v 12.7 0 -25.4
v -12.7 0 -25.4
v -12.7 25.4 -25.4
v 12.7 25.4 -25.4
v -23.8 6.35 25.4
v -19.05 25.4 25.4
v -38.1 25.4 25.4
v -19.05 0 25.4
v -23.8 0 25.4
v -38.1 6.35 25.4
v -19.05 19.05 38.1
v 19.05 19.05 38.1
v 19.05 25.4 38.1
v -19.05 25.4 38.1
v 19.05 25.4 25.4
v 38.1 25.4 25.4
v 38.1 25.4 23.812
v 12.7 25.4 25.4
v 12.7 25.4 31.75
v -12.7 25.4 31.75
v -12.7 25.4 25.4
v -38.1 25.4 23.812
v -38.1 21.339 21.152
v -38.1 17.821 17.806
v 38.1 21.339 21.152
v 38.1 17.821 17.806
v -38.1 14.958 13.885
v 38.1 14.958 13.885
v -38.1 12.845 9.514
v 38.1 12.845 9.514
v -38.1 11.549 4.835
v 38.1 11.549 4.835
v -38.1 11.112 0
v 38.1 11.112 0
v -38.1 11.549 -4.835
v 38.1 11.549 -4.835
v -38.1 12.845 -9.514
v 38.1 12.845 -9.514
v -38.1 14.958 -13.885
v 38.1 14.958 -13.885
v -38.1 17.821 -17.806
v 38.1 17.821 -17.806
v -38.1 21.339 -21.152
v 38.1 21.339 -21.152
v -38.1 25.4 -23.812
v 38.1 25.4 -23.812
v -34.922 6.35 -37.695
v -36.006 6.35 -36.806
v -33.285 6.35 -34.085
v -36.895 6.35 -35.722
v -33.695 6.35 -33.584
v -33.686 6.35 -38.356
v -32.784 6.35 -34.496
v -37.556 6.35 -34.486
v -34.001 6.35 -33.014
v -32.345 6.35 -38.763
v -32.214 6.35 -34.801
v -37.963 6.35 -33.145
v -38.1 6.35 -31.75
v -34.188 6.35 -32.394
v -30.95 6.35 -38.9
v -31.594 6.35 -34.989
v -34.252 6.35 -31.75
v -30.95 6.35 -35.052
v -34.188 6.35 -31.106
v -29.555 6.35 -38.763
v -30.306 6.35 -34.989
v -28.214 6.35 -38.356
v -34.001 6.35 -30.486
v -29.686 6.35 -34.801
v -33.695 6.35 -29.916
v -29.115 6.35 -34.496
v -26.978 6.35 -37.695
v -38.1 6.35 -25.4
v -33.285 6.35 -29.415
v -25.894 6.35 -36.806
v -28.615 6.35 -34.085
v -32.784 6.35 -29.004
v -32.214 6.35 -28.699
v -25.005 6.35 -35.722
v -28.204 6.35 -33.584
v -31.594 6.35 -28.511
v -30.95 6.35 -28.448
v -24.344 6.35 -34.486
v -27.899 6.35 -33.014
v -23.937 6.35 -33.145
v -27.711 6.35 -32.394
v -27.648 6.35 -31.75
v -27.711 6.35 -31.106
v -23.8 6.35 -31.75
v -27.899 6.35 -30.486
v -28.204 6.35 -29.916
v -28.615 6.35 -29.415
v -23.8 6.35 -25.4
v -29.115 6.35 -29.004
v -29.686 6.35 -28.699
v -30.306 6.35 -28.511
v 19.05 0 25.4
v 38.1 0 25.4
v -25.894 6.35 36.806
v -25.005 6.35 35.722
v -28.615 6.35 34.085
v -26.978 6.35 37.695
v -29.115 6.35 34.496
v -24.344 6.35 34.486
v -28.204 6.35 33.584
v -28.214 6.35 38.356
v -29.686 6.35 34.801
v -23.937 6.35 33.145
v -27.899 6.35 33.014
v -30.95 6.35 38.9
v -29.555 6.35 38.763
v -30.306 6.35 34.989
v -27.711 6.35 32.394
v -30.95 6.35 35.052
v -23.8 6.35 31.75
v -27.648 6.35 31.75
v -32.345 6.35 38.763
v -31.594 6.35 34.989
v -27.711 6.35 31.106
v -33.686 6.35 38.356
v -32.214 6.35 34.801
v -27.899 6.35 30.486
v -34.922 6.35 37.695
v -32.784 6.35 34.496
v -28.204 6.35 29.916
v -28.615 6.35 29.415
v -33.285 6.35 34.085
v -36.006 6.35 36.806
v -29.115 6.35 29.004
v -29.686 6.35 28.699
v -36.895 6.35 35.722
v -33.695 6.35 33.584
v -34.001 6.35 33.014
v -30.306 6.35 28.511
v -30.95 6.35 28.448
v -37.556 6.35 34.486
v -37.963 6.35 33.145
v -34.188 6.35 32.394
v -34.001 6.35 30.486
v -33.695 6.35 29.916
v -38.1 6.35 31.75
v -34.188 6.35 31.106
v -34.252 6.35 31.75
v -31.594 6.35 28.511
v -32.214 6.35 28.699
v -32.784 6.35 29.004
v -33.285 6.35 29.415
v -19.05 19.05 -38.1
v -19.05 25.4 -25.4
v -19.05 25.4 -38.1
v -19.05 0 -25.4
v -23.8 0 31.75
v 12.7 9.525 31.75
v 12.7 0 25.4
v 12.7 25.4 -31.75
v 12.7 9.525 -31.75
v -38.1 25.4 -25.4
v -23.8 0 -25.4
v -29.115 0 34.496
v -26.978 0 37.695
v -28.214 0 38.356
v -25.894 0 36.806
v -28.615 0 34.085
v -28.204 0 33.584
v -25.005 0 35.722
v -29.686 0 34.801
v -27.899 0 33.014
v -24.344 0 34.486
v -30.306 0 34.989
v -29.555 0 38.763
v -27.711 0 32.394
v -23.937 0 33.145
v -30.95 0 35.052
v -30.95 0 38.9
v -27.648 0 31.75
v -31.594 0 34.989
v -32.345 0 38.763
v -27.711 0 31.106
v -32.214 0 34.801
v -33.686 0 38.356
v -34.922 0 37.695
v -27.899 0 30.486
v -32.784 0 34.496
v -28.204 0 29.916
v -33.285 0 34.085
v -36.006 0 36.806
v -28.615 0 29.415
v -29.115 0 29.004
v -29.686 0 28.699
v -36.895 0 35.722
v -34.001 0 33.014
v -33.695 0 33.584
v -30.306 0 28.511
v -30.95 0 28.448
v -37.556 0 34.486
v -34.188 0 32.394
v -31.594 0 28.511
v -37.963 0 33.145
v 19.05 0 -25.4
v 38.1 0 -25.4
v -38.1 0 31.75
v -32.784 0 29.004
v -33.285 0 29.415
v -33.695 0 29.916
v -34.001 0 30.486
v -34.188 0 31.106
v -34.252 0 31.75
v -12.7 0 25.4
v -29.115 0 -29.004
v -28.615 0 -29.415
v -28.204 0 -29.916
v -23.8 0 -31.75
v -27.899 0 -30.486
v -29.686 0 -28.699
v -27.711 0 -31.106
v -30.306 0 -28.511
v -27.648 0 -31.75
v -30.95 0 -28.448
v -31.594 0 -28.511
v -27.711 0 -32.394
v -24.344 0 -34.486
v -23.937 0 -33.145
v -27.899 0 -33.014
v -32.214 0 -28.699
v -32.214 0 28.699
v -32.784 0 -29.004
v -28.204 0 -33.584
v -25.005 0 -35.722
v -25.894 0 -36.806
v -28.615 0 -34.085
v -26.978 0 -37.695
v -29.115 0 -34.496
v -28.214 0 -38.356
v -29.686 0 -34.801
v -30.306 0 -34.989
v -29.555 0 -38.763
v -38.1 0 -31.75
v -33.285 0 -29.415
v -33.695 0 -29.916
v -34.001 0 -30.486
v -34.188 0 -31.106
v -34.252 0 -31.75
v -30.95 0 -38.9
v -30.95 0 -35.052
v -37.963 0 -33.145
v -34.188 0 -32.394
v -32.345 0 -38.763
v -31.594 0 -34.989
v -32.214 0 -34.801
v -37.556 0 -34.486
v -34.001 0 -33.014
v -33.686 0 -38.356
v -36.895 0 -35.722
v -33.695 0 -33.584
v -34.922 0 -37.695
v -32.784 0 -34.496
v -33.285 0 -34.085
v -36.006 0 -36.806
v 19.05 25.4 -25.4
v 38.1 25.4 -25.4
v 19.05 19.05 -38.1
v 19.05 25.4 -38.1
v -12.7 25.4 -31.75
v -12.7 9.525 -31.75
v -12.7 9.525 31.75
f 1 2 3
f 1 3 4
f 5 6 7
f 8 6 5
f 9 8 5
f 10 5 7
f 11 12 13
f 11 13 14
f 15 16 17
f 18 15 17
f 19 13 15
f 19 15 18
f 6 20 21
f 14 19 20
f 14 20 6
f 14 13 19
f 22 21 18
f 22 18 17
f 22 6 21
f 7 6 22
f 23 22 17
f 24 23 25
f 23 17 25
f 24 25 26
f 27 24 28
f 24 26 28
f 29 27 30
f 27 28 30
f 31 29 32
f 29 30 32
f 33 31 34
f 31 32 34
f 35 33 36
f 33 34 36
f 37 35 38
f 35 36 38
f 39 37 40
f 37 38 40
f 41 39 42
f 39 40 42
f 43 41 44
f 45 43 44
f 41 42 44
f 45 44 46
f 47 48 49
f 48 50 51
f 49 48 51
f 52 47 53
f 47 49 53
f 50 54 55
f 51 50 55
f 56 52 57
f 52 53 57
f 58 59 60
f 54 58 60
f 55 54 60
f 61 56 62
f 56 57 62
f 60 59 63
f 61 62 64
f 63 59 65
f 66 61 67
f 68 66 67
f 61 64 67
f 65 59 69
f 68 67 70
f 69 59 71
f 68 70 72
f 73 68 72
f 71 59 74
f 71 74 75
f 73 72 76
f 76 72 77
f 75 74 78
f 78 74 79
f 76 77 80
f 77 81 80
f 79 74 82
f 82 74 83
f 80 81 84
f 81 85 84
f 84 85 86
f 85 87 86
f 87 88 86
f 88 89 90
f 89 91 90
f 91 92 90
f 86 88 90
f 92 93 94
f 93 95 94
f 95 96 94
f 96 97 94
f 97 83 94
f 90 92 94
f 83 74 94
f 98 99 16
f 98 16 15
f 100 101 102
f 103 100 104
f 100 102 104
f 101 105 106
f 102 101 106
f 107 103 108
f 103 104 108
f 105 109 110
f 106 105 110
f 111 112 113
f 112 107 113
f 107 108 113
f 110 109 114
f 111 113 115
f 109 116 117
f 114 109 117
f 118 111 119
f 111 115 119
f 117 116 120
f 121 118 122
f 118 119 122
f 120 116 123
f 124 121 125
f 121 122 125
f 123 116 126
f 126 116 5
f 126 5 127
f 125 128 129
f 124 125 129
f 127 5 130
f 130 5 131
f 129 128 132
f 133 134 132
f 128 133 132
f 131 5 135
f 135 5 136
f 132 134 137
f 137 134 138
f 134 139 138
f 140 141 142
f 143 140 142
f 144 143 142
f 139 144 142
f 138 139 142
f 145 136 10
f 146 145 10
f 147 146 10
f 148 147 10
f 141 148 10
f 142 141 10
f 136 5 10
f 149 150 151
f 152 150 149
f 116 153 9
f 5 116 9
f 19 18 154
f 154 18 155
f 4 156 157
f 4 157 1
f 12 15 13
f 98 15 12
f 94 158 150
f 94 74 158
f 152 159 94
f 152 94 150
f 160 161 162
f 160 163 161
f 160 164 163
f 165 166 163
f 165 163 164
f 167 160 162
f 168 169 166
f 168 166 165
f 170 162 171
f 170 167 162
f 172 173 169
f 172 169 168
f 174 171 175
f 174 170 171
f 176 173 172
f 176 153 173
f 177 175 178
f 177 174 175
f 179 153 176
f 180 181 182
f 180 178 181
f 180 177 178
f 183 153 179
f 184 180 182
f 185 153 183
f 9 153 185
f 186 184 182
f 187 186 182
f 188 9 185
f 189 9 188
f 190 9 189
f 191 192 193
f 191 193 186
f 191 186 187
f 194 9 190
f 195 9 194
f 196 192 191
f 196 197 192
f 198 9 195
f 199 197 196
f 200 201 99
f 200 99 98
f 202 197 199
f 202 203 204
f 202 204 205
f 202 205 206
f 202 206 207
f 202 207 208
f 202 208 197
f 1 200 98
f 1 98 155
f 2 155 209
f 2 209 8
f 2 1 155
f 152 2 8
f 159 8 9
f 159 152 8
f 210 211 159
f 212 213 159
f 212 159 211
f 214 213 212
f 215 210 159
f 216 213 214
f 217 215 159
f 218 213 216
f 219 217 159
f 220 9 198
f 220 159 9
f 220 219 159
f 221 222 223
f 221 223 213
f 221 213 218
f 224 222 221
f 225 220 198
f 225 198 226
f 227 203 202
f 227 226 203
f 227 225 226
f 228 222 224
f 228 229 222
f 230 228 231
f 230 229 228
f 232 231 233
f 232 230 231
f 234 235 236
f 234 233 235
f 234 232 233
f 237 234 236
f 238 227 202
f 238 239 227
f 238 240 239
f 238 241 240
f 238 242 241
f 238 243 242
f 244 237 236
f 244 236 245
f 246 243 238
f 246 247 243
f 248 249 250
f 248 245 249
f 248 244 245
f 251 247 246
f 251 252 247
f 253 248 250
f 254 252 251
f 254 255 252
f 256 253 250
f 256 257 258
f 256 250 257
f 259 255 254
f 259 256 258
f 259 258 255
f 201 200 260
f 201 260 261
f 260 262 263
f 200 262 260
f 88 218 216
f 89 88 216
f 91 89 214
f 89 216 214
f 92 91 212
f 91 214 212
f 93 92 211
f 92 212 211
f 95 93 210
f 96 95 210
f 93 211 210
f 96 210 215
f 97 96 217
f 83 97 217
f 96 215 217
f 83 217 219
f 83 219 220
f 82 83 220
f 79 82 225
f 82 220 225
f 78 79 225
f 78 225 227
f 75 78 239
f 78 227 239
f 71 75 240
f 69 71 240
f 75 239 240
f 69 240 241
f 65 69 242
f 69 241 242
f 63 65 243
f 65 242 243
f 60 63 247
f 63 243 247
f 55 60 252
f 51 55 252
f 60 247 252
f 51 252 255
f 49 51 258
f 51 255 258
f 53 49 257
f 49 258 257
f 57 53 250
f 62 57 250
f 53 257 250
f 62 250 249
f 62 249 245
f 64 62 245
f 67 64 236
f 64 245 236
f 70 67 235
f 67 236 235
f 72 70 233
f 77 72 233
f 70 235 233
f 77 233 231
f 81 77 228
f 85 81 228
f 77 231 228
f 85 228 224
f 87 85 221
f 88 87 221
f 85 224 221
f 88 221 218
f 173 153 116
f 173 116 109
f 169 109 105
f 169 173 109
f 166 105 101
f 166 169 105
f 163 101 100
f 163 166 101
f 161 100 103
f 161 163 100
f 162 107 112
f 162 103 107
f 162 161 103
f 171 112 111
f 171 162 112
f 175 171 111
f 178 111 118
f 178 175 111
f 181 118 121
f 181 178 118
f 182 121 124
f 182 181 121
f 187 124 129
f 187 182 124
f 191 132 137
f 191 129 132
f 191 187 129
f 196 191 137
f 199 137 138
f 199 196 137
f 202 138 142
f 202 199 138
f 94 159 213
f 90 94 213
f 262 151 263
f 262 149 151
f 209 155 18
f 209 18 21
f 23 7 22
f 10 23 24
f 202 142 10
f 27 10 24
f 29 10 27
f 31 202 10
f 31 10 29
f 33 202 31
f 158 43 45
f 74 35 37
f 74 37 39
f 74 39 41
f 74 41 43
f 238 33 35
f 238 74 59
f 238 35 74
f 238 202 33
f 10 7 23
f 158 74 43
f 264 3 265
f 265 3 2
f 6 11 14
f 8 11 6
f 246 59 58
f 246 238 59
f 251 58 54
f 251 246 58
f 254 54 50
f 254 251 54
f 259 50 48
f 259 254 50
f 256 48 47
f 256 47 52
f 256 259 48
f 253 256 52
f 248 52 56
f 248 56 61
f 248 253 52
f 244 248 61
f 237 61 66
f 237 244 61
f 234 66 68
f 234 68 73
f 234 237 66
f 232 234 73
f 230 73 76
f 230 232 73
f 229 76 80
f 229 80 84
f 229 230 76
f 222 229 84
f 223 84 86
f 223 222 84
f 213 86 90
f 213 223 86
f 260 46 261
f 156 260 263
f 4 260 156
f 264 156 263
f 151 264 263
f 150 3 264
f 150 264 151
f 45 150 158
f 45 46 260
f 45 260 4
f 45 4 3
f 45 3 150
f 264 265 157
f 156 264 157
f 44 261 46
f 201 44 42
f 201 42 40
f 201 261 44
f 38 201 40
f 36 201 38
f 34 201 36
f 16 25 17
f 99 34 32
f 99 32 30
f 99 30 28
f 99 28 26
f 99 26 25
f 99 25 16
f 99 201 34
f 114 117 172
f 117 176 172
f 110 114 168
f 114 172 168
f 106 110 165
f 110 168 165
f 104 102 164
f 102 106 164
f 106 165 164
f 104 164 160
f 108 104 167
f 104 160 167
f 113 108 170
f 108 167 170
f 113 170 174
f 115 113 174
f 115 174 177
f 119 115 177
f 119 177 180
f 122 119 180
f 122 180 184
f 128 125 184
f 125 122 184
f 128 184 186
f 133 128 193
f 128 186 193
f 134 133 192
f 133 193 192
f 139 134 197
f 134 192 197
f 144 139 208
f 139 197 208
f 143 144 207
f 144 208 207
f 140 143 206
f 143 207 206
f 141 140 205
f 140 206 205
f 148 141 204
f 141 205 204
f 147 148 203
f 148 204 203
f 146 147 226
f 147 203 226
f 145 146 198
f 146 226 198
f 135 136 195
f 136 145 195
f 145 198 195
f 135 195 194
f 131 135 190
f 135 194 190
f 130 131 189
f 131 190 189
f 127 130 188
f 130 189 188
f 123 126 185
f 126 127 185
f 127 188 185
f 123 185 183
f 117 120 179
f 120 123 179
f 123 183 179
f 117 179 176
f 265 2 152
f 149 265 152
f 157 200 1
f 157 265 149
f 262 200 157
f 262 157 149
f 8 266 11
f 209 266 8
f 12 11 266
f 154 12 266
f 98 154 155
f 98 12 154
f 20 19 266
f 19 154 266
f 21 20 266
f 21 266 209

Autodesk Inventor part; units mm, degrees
ref_plane "YZ Plane" through (0, 0, 0) normal (1, 0, 0) x (0, 1, 0)
ref_plane "XZ Plane" through (0, 0, 0) normal (0, 1, 0) x (-1, 0, 0)
ref_plane "XY Plane" through (0, 0, 0) normal (0, 0, 1) x (1, 0, 0)
sketch "Sketch1" plane through (0, 0, 0) normal (0, 1, 0) x (-1, 0, 0)
  line L0 (-38.1, 25.4) -> (38.1, 25.4)
  line L1 (38.1, 25.4) -> (38.1, -25.4)
  line L2 (38.1, -25.4) -> (-38.1, -25.4)
  line L3 (-38.1, -25.4) -> (-38.1, 25.4)
  point P0 (0, 0)
  dimension "d0" = 50.8
  dimension "d1" = 76.2
  dimension "d2" = 25.4
  dimension "d3" = 38.1
extrude "Extrusion1" add sketch "Sketch1" along normal blind 25.4
sketch "Sketch2" plane through (38.1, 0, 25.4) normal (1, 0, 0) x (0, 0, -1)
  circle A0 centre (25.4, 38.1) radius 26.9875
  line L0 (0, 0) -> (50.8, 0) projected
  line L1 (50.8, 0) -> (50.8, 25.4) projected
  line L2 (0, 25.4) -> (50.8, 25.4) projected
  line L3 (0, 0) -> (0, 25.4) projected
  point P0 (25.4, 0)
  dimension "d6" = 53.975
extrude "Extrusion2" cut sketch "Sketch2" against normal through all contours A0 L2 | L2 A0
sketch "Sketch3" plane through (0, 0, 0) normal (0, -1, 0) x (1, 0, 0)
  line L0 (38.1, -25.4) -> (-38.1, -25.4) projected
  line L1 (19.05, -25.4) -> (-19.05, -25.4)
  line L2 (-19.05, -25.4) -> (-19.05, -38.1)
  line L3 (19.05, -38.1) -> (19.05, -25.4)
  line L4 (12.7, -25.4) -> (-12.7, -25.4)
  line L5 (-12.7, -25.4) -> (-12.7, -31.75)
  line L6 (-12.7, -31.75) -> (12.7, -31.75)
  line L7 (12.7, -31.75) -> (12.7, -25.4)
  line L8 (38.1, -25.4) -> (-38.1, -25.4) projected
  line L9 (38.1, 25.4) -> (38.1, -25.4) projected
  line L10 (-38.1, 25.4) -> (38.1, 25.4) projected
  line L11 (-38.1, -25.4) -> (-38.1, 25.4) projected
  line L12 (-19.05, -38.1) -> (19.05, -38.1)
  point P0 (0, 0)
  point P1 (12.7, -28.575)
  dimension "d10" = 25.4
  dimension "d11" = 6.35
  dimension "d12" = 6.35
  dimension "d13" = 6.35
  dimension "d14" = 6.35
  dimension "d16" = 12.7
extrude "Extrusion3" add sketch "Sketch3" against normal blind 25.4 contours L3 L12 L2 L0 L5 L6 L7
sketch "Sketch4" plane through (19.05, 0, -25.4) normal (1, 0, 0) x (0, 0, -1)
  line L0 (12.7, 0) -> (0, 0) projected
  line L1 (12.7, 0) -> (12.7, 25.4) projected
  line L2 (0, 25.4) -> (12.7, 25.4) projected
  line L3 (0, 0) -> (0, 25.4) projected
  arc A0 (-49.2125, 25.4) -> (-1.5875, 25.4) centre (-25.4, 38.1) ccw projected
  line L4 (-50.8, 25.4) -> (-49.2125, 25.4) projected
  line L5 (-50.8, 0) -> (-50.8, 25.4) projected
  line L6 (-50.8, 0) -> (0, 0) projected
  line L7 (0, 0) -> (0, 25.4) projected
  line L8 (-1.5875, 25.4) -> (0, 25.4) projected
  line L9 (6.35, 0) -> (0, 0) projected
  line L10 (0, 0) -> (12.7, 19.05)
  line L11 (12.7, 0) -> (12.7, 25.4) projected
  point P0 (-25.4, 0)
  point P1 (12.7, 19.05)
  dimension "d19" = 6.35
extrude "Extrusion4" cut sketch "Sketch4" against normal through all contours L0 L10 L1
mirror "Mirror1" about plane through (0, 0, 0) normal (0, 0, 1) of "Extrusion3", "Extrusion4"
sketch "Sketch5" plane through (0, 0, 0) normal (0, -1, 0) x (1, 0, 0)
  line L0 (-12.7, 25.4) -> (-19.05, 25.4) projected
  line L1 (-38.1, 25.4) -> (-19.05, 25.4) projected
  line L2 (-38.1, -25.4) -> (-38.1, 25.4) projected
  line L3 (-19.05, -25.4) -> (-38.1, -25.4) projected
  line L4 (-19.05, -25.4) -> (-12.7, -25.4) projected
  line L5 (12.7, -25.4) -> (-12.7, -25.4) projected
  line L6 (12.7, -25.4) -> (19.05, -25.4) projected
  line L7 (38.1, -25.4) -> (19.05, -25.4) projected
  line L8 (38.1, 25.4) -> (38.1, -25.4) projected
  line L9 (19.05, 25.4) -> (38.1, 25.4) projected
  line L10 (19.05, 25.4) -> (12.7, 25.4) projected
  line L11 (-12.7, 25.4) -> (12.7, 25.4) projected
  line L12 (38.1, 25.4) -> (38.1, 23.8125) projected
  line L13 (38.1, 25.4) -> (38.1, 31.75)
  line L14 (19.05, 25.4) -> (38.1, 25.4) projected
  line L15 (29.0711, 25.4) -> (29.0711, 31.75)
  line L16 (-38.1, -25.4) -> (-38.1, -23.8125) projected
  line L17 (-38.1, -25.4) -> (-38.1, -31.75)
  line L18 (-23.7998, -25.4) -> (-23.7998, -31.75)
  circle A0 centre (-30.9499, -31.75) radius 3.302
  arc A1 (-38.1, -31.75) -> (-23.7998, -31.75) centre (-30.9499, -31.75) ccw
  point P0 (0, 0)
  dimension "d23" = 14.3002
  dimension "d24" = 6.35
  dimension "d25" = 6.35
  dimension "d26" = 6.604
  dimension "d27" = 6.35
  dimension "d28" = 7.1501
  dimension "d29" = 6.35
extrude "Extrusion5" add sketch "Sketch5" against normal blind 6.35 contours L3 L18 A1 L17
mirror "Mirror2" about plane through (0, 0, 0) normal (0, 0, 1) of "Extrusion5"
equation "\"d2\" = 0.5 * d0"
equation "\"d3\" = 0.5 * d1"
equation "\"d12\" = d11"
equation "\"d13\" = d11"
equation "\"d16\" = 0.5 * d10"
equation "\"d25\" = d24"
equation "\"d27\" = d24"
equation "\"d28\" = 0.5 * d23"
equation "\"d29\" = d24"
properties part number "Part_4_scooter_attachment"
